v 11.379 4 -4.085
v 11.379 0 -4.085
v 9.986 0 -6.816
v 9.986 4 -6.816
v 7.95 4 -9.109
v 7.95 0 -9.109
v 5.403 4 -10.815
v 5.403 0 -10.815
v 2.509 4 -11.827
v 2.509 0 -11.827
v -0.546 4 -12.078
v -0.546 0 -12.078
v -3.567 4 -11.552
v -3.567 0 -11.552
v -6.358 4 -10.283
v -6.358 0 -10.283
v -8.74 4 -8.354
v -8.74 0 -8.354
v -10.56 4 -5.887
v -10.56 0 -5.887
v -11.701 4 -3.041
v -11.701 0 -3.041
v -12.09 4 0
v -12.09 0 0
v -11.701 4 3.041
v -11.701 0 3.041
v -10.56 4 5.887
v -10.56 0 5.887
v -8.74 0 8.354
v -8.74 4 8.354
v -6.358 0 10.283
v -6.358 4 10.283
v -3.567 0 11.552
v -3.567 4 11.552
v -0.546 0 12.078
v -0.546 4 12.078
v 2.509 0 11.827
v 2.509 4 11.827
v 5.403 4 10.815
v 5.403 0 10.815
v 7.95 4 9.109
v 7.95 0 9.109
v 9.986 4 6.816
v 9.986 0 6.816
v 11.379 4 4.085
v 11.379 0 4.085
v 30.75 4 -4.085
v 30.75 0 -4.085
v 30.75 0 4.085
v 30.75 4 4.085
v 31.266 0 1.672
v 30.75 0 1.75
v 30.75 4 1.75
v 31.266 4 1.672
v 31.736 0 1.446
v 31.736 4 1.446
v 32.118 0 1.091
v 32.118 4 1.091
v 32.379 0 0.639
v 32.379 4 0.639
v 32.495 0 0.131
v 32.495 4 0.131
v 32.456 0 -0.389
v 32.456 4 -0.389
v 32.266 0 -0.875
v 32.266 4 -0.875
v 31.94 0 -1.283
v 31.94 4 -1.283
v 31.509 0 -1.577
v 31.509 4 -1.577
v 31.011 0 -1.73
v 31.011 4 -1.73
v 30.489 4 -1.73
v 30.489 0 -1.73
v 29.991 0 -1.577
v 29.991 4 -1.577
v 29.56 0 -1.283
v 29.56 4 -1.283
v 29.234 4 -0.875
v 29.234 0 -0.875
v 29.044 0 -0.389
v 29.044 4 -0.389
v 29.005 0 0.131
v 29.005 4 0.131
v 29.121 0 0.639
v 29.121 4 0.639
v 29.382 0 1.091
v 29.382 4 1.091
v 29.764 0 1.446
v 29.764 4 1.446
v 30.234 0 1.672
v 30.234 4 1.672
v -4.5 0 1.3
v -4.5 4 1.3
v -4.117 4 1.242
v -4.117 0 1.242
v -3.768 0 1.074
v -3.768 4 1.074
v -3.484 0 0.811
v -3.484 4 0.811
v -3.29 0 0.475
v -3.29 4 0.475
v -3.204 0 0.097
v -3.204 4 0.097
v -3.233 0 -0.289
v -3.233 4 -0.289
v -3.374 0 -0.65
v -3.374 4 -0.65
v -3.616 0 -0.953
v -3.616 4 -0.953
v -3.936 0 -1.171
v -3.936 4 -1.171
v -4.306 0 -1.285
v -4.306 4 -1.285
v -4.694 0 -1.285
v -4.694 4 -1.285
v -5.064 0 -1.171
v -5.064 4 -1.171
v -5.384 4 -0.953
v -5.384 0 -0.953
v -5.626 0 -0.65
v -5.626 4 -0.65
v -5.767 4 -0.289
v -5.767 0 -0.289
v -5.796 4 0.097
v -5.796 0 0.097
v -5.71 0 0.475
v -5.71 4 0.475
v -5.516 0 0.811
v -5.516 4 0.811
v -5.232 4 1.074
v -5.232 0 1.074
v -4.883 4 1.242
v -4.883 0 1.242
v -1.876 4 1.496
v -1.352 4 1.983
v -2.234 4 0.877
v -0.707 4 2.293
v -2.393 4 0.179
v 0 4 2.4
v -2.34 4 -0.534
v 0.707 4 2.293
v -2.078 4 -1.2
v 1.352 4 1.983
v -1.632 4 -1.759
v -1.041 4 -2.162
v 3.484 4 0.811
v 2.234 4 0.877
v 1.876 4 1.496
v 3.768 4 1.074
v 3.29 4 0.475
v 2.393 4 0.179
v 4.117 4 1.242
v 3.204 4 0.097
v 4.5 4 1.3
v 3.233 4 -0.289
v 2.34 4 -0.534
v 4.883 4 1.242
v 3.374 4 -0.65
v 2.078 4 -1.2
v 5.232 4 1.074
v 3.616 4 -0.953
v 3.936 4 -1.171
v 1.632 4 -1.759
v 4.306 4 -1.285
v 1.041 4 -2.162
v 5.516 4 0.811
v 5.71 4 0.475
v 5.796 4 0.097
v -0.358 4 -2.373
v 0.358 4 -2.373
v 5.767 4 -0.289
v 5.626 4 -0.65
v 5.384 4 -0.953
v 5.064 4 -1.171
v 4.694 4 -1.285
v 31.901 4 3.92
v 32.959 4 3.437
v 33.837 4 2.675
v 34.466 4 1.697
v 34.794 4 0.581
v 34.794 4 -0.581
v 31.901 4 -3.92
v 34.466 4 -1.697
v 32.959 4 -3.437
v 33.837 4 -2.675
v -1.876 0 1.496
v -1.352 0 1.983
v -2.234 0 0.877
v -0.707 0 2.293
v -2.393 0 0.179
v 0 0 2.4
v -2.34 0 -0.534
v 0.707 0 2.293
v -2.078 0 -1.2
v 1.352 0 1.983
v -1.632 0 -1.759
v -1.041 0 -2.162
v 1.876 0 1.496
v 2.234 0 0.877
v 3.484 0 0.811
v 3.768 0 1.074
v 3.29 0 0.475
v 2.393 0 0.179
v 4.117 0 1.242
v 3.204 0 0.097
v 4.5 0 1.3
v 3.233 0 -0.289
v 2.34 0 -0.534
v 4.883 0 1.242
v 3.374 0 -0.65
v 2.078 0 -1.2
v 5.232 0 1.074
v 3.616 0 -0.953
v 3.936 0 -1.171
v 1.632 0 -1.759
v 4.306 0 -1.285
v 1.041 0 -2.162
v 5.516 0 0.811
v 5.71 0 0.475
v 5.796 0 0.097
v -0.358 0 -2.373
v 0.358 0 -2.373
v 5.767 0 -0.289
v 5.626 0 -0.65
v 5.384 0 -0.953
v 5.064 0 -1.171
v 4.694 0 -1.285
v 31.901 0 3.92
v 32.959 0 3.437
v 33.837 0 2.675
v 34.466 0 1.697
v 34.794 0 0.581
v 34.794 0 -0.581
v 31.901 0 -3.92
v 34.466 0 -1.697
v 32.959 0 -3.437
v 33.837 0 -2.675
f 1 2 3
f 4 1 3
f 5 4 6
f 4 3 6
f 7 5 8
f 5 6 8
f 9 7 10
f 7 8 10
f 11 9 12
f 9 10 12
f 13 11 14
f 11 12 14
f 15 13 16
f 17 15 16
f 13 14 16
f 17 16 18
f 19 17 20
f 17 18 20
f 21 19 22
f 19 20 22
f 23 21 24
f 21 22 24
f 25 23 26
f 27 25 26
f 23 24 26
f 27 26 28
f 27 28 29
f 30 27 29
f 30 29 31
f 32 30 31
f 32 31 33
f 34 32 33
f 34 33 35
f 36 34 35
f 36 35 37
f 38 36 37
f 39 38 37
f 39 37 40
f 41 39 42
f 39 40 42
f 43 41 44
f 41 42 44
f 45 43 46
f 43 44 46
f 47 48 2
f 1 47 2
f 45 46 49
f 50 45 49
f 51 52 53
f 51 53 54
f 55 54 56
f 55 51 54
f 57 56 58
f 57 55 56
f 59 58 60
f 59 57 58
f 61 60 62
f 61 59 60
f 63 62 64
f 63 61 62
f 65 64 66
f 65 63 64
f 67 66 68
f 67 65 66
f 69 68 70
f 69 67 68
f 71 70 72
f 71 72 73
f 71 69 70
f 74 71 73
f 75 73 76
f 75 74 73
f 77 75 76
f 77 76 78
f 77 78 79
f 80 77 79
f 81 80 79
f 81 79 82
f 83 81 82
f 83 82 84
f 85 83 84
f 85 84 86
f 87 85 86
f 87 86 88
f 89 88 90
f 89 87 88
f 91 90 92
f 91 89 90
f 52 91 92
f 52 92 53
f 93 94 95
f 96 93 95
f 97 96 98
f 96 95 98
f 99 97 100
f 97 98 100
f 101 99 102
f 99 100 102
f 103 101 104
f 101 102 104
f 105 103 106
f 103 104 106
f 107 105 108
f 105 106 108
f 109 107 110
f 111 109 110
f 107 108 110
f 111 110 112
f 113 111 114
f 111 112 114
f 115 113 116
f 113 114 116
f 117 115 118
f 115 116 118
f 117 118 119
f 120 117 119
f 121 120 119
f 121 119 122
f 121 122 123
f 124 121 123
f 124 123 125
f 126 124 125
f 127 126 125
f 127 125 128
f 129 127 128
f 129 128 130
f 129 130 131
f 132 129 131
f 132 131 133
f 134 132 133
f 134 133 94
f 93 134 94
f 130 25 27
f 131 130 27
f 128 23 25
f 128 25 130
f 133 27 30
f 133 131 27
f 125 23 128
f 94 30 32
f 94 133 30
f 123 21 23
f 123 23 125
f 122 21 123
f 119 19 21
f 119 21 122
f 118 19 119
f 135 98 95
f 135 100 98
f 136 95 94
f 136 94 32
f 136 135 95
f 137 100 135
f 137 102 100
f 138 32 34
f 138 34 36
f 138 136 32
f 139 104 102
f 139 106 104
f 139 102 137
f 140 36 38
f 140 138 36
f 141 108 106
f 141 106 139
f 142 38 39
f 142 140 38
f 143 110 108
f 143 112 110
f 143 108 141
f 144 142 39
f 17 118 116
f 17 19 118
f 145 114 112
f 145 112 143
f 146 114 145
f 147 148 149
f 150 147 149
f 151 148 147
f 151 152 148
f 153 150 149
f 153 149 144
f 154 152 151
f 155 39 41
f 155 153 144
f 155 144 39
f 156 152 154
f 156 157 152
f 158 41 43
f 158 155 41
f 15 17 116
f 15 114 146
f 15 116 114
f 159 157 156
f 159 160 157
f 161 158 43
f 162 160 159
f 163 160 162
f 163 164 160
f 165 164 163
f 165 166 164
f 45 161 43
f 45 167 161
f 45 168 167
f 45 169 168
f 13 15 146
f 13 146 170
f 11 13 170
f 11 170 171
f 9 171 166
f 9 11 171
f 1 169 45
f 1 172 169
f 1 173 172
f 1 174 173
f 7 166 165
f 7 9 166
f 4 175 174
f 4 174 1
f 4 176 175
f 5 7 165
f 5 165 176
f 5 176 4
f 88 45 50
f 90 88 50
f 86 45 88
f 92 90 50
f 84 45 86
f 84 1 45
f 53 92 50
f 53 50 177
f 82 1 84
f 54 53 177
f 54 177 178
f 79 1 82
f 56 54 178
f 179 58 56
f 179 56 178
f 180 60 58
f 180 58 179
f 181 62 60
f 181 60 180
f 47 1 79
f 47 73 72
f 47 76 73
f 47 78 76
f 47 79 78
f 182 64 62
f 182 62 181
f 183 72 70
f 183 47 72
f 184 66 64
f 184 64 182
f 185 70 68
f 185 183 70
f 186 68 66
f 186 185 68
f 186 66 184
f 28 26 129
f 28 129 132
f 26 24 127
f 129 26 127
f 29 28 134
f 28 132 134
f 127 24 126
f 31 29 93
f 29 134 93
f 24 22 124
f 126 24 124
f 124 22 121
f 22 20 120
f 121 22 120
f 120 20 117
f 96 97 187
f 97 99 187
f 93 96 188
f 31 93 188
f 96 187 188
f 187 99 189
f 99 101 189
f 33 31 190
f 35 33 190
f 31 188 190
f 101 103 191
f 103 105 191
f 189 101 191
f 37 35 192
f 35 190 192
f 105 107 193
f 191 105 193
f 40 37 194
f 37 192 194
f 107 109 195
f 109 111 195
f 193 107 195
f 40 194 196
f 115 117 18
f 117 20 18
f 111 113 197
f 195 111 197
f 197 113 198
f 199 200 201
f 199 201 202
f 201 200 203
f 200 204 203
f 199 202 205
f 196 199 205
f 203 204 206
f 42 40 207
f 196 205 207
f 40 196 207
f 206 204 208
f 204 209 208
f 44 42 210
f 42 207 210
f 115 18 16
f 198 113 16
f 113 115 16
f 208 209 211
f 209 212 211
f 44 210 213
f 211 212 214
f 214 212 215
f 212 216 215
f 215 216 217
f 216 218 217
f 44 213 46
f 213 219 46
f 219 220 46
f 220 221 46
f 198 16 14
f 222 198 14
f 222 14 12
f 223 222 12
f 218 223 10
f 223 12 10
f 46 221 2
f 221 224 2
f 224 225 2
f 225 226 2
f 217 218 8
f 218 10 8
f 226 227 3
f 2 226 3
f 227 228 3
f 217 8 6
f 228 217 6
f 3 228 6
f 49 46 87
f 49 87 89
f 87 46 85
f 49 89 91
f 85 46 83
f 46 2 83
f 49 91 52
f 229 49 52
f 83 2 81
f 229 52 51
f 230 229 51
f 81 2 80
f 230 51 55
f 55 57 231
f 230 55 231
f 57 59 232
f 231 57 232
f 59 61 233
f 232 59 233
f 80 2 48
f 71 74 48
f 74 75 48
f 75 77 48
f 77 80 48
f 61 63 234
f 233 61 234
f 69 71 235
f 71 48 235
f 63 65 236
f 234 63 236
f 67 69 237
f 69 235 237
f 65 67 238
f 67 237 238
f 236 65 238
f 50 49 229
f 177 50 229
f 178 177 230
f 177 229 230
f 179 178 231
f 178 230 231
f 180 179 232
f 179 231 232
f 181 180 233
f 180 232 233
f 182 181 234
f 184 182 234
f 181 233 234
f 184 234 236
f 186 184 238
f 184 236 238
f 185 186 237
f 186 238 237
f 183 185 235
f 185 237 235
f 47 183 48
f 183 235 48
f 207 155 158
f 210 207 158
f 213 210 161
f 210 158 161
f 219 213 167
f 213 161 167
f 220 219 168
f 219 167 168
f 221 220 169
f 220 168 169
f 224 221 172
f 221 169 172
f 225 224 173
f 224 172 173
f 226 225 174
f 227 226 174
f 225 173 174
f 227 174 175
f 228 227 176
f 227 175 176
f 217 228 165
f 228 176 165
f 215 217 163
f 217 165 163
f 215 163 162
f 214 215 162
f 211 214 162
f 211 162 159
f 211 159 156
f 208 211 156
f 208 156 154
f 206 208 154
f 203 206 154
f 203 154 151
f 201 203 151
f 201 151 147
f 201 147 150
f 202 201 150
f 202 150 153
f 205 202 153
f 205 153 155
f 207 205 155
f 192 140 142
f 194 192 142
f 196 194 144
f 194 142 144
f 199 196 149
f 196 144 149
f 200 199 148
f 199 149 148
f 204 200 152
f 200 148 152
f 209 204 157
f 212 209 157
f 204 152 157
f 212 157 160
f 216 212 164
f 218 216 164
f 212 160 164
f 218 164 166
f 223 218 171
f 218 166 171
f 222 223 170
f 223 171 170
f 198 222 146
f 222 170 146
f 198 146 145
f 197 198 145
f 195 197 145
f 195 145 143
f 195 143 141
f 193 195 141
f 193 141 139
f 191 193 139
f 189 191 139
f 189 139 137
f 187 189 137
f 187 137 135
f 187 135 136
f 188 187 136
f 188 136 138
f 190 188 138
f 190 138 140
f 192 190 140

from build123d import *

# Parameters (mm, degrees)
SKETCH_2_R          = 1.75
EXTRUDE_1_DEPTH     = 4
SKETCH_3_R          = 2.4
SKETCH_3_R_2        = 1.3
CUT_EXTRUDE_1_DEPTH = 38.089795808


with BuildPart() as part:
    # 草图2 → 凸台-拉伸1 (new body)
    with BuildSketch(Plane(origin=(0, 0, 0), x_dir=(1, 0, 0), z_dir=(0, 1, 0))):
        with BuildLine():
            Line((30.75, 4.085109489), (11.378927035, 4.085109489))
            ThreePointArc((11.378927035, 4.085109489), (-12.09, 0), (11.378927035, -4.085109489))
            Line((11.378927035, -4.085109489), (30.75, -4.085109489))
            ThreePointArc((30.75, -4.085109489), (34.835109489, 0), (30.75, 4.085109489))
        make_face()
        with Locations(Location((30.75, 0, 0), (0, 0, 270))):
            Circle(SKETCH_2_R, mode=Mode.SUBTRACT)
        with Locations(Location((0, 0, 0), (0, 0, 270))):
            Circle(SKETCH_2_R, mode=Mode.SUBTRACT)
    extrude(amount=EXTRUDE_1_DEPTH)

    # 草图3 → 切除-拉伸1 (cut, through all)
    with BuildSketch(Plane(origin=(0, 4, 0), x_dir=(1, 0, 0), z_dir=(0, 1, 0))):
        with Locations(Location((0, 0, 0), (0, 0, 270))):
            Circle(SKETCH_3_R)
        with Locations(Location((4.5, 0, 0), (0, 0, 270))):
            Circle(SKETCH_3_R_2)
        with Locations(Location((-4.5, 0, 0), (0, 0, 270))):
            Circle(SKETCH_3_R_2)
    extrude(amount=-CUT_EXTRUDE_1_DEPTH, mode=Mode.SUBTRACT)


solid = part.part
